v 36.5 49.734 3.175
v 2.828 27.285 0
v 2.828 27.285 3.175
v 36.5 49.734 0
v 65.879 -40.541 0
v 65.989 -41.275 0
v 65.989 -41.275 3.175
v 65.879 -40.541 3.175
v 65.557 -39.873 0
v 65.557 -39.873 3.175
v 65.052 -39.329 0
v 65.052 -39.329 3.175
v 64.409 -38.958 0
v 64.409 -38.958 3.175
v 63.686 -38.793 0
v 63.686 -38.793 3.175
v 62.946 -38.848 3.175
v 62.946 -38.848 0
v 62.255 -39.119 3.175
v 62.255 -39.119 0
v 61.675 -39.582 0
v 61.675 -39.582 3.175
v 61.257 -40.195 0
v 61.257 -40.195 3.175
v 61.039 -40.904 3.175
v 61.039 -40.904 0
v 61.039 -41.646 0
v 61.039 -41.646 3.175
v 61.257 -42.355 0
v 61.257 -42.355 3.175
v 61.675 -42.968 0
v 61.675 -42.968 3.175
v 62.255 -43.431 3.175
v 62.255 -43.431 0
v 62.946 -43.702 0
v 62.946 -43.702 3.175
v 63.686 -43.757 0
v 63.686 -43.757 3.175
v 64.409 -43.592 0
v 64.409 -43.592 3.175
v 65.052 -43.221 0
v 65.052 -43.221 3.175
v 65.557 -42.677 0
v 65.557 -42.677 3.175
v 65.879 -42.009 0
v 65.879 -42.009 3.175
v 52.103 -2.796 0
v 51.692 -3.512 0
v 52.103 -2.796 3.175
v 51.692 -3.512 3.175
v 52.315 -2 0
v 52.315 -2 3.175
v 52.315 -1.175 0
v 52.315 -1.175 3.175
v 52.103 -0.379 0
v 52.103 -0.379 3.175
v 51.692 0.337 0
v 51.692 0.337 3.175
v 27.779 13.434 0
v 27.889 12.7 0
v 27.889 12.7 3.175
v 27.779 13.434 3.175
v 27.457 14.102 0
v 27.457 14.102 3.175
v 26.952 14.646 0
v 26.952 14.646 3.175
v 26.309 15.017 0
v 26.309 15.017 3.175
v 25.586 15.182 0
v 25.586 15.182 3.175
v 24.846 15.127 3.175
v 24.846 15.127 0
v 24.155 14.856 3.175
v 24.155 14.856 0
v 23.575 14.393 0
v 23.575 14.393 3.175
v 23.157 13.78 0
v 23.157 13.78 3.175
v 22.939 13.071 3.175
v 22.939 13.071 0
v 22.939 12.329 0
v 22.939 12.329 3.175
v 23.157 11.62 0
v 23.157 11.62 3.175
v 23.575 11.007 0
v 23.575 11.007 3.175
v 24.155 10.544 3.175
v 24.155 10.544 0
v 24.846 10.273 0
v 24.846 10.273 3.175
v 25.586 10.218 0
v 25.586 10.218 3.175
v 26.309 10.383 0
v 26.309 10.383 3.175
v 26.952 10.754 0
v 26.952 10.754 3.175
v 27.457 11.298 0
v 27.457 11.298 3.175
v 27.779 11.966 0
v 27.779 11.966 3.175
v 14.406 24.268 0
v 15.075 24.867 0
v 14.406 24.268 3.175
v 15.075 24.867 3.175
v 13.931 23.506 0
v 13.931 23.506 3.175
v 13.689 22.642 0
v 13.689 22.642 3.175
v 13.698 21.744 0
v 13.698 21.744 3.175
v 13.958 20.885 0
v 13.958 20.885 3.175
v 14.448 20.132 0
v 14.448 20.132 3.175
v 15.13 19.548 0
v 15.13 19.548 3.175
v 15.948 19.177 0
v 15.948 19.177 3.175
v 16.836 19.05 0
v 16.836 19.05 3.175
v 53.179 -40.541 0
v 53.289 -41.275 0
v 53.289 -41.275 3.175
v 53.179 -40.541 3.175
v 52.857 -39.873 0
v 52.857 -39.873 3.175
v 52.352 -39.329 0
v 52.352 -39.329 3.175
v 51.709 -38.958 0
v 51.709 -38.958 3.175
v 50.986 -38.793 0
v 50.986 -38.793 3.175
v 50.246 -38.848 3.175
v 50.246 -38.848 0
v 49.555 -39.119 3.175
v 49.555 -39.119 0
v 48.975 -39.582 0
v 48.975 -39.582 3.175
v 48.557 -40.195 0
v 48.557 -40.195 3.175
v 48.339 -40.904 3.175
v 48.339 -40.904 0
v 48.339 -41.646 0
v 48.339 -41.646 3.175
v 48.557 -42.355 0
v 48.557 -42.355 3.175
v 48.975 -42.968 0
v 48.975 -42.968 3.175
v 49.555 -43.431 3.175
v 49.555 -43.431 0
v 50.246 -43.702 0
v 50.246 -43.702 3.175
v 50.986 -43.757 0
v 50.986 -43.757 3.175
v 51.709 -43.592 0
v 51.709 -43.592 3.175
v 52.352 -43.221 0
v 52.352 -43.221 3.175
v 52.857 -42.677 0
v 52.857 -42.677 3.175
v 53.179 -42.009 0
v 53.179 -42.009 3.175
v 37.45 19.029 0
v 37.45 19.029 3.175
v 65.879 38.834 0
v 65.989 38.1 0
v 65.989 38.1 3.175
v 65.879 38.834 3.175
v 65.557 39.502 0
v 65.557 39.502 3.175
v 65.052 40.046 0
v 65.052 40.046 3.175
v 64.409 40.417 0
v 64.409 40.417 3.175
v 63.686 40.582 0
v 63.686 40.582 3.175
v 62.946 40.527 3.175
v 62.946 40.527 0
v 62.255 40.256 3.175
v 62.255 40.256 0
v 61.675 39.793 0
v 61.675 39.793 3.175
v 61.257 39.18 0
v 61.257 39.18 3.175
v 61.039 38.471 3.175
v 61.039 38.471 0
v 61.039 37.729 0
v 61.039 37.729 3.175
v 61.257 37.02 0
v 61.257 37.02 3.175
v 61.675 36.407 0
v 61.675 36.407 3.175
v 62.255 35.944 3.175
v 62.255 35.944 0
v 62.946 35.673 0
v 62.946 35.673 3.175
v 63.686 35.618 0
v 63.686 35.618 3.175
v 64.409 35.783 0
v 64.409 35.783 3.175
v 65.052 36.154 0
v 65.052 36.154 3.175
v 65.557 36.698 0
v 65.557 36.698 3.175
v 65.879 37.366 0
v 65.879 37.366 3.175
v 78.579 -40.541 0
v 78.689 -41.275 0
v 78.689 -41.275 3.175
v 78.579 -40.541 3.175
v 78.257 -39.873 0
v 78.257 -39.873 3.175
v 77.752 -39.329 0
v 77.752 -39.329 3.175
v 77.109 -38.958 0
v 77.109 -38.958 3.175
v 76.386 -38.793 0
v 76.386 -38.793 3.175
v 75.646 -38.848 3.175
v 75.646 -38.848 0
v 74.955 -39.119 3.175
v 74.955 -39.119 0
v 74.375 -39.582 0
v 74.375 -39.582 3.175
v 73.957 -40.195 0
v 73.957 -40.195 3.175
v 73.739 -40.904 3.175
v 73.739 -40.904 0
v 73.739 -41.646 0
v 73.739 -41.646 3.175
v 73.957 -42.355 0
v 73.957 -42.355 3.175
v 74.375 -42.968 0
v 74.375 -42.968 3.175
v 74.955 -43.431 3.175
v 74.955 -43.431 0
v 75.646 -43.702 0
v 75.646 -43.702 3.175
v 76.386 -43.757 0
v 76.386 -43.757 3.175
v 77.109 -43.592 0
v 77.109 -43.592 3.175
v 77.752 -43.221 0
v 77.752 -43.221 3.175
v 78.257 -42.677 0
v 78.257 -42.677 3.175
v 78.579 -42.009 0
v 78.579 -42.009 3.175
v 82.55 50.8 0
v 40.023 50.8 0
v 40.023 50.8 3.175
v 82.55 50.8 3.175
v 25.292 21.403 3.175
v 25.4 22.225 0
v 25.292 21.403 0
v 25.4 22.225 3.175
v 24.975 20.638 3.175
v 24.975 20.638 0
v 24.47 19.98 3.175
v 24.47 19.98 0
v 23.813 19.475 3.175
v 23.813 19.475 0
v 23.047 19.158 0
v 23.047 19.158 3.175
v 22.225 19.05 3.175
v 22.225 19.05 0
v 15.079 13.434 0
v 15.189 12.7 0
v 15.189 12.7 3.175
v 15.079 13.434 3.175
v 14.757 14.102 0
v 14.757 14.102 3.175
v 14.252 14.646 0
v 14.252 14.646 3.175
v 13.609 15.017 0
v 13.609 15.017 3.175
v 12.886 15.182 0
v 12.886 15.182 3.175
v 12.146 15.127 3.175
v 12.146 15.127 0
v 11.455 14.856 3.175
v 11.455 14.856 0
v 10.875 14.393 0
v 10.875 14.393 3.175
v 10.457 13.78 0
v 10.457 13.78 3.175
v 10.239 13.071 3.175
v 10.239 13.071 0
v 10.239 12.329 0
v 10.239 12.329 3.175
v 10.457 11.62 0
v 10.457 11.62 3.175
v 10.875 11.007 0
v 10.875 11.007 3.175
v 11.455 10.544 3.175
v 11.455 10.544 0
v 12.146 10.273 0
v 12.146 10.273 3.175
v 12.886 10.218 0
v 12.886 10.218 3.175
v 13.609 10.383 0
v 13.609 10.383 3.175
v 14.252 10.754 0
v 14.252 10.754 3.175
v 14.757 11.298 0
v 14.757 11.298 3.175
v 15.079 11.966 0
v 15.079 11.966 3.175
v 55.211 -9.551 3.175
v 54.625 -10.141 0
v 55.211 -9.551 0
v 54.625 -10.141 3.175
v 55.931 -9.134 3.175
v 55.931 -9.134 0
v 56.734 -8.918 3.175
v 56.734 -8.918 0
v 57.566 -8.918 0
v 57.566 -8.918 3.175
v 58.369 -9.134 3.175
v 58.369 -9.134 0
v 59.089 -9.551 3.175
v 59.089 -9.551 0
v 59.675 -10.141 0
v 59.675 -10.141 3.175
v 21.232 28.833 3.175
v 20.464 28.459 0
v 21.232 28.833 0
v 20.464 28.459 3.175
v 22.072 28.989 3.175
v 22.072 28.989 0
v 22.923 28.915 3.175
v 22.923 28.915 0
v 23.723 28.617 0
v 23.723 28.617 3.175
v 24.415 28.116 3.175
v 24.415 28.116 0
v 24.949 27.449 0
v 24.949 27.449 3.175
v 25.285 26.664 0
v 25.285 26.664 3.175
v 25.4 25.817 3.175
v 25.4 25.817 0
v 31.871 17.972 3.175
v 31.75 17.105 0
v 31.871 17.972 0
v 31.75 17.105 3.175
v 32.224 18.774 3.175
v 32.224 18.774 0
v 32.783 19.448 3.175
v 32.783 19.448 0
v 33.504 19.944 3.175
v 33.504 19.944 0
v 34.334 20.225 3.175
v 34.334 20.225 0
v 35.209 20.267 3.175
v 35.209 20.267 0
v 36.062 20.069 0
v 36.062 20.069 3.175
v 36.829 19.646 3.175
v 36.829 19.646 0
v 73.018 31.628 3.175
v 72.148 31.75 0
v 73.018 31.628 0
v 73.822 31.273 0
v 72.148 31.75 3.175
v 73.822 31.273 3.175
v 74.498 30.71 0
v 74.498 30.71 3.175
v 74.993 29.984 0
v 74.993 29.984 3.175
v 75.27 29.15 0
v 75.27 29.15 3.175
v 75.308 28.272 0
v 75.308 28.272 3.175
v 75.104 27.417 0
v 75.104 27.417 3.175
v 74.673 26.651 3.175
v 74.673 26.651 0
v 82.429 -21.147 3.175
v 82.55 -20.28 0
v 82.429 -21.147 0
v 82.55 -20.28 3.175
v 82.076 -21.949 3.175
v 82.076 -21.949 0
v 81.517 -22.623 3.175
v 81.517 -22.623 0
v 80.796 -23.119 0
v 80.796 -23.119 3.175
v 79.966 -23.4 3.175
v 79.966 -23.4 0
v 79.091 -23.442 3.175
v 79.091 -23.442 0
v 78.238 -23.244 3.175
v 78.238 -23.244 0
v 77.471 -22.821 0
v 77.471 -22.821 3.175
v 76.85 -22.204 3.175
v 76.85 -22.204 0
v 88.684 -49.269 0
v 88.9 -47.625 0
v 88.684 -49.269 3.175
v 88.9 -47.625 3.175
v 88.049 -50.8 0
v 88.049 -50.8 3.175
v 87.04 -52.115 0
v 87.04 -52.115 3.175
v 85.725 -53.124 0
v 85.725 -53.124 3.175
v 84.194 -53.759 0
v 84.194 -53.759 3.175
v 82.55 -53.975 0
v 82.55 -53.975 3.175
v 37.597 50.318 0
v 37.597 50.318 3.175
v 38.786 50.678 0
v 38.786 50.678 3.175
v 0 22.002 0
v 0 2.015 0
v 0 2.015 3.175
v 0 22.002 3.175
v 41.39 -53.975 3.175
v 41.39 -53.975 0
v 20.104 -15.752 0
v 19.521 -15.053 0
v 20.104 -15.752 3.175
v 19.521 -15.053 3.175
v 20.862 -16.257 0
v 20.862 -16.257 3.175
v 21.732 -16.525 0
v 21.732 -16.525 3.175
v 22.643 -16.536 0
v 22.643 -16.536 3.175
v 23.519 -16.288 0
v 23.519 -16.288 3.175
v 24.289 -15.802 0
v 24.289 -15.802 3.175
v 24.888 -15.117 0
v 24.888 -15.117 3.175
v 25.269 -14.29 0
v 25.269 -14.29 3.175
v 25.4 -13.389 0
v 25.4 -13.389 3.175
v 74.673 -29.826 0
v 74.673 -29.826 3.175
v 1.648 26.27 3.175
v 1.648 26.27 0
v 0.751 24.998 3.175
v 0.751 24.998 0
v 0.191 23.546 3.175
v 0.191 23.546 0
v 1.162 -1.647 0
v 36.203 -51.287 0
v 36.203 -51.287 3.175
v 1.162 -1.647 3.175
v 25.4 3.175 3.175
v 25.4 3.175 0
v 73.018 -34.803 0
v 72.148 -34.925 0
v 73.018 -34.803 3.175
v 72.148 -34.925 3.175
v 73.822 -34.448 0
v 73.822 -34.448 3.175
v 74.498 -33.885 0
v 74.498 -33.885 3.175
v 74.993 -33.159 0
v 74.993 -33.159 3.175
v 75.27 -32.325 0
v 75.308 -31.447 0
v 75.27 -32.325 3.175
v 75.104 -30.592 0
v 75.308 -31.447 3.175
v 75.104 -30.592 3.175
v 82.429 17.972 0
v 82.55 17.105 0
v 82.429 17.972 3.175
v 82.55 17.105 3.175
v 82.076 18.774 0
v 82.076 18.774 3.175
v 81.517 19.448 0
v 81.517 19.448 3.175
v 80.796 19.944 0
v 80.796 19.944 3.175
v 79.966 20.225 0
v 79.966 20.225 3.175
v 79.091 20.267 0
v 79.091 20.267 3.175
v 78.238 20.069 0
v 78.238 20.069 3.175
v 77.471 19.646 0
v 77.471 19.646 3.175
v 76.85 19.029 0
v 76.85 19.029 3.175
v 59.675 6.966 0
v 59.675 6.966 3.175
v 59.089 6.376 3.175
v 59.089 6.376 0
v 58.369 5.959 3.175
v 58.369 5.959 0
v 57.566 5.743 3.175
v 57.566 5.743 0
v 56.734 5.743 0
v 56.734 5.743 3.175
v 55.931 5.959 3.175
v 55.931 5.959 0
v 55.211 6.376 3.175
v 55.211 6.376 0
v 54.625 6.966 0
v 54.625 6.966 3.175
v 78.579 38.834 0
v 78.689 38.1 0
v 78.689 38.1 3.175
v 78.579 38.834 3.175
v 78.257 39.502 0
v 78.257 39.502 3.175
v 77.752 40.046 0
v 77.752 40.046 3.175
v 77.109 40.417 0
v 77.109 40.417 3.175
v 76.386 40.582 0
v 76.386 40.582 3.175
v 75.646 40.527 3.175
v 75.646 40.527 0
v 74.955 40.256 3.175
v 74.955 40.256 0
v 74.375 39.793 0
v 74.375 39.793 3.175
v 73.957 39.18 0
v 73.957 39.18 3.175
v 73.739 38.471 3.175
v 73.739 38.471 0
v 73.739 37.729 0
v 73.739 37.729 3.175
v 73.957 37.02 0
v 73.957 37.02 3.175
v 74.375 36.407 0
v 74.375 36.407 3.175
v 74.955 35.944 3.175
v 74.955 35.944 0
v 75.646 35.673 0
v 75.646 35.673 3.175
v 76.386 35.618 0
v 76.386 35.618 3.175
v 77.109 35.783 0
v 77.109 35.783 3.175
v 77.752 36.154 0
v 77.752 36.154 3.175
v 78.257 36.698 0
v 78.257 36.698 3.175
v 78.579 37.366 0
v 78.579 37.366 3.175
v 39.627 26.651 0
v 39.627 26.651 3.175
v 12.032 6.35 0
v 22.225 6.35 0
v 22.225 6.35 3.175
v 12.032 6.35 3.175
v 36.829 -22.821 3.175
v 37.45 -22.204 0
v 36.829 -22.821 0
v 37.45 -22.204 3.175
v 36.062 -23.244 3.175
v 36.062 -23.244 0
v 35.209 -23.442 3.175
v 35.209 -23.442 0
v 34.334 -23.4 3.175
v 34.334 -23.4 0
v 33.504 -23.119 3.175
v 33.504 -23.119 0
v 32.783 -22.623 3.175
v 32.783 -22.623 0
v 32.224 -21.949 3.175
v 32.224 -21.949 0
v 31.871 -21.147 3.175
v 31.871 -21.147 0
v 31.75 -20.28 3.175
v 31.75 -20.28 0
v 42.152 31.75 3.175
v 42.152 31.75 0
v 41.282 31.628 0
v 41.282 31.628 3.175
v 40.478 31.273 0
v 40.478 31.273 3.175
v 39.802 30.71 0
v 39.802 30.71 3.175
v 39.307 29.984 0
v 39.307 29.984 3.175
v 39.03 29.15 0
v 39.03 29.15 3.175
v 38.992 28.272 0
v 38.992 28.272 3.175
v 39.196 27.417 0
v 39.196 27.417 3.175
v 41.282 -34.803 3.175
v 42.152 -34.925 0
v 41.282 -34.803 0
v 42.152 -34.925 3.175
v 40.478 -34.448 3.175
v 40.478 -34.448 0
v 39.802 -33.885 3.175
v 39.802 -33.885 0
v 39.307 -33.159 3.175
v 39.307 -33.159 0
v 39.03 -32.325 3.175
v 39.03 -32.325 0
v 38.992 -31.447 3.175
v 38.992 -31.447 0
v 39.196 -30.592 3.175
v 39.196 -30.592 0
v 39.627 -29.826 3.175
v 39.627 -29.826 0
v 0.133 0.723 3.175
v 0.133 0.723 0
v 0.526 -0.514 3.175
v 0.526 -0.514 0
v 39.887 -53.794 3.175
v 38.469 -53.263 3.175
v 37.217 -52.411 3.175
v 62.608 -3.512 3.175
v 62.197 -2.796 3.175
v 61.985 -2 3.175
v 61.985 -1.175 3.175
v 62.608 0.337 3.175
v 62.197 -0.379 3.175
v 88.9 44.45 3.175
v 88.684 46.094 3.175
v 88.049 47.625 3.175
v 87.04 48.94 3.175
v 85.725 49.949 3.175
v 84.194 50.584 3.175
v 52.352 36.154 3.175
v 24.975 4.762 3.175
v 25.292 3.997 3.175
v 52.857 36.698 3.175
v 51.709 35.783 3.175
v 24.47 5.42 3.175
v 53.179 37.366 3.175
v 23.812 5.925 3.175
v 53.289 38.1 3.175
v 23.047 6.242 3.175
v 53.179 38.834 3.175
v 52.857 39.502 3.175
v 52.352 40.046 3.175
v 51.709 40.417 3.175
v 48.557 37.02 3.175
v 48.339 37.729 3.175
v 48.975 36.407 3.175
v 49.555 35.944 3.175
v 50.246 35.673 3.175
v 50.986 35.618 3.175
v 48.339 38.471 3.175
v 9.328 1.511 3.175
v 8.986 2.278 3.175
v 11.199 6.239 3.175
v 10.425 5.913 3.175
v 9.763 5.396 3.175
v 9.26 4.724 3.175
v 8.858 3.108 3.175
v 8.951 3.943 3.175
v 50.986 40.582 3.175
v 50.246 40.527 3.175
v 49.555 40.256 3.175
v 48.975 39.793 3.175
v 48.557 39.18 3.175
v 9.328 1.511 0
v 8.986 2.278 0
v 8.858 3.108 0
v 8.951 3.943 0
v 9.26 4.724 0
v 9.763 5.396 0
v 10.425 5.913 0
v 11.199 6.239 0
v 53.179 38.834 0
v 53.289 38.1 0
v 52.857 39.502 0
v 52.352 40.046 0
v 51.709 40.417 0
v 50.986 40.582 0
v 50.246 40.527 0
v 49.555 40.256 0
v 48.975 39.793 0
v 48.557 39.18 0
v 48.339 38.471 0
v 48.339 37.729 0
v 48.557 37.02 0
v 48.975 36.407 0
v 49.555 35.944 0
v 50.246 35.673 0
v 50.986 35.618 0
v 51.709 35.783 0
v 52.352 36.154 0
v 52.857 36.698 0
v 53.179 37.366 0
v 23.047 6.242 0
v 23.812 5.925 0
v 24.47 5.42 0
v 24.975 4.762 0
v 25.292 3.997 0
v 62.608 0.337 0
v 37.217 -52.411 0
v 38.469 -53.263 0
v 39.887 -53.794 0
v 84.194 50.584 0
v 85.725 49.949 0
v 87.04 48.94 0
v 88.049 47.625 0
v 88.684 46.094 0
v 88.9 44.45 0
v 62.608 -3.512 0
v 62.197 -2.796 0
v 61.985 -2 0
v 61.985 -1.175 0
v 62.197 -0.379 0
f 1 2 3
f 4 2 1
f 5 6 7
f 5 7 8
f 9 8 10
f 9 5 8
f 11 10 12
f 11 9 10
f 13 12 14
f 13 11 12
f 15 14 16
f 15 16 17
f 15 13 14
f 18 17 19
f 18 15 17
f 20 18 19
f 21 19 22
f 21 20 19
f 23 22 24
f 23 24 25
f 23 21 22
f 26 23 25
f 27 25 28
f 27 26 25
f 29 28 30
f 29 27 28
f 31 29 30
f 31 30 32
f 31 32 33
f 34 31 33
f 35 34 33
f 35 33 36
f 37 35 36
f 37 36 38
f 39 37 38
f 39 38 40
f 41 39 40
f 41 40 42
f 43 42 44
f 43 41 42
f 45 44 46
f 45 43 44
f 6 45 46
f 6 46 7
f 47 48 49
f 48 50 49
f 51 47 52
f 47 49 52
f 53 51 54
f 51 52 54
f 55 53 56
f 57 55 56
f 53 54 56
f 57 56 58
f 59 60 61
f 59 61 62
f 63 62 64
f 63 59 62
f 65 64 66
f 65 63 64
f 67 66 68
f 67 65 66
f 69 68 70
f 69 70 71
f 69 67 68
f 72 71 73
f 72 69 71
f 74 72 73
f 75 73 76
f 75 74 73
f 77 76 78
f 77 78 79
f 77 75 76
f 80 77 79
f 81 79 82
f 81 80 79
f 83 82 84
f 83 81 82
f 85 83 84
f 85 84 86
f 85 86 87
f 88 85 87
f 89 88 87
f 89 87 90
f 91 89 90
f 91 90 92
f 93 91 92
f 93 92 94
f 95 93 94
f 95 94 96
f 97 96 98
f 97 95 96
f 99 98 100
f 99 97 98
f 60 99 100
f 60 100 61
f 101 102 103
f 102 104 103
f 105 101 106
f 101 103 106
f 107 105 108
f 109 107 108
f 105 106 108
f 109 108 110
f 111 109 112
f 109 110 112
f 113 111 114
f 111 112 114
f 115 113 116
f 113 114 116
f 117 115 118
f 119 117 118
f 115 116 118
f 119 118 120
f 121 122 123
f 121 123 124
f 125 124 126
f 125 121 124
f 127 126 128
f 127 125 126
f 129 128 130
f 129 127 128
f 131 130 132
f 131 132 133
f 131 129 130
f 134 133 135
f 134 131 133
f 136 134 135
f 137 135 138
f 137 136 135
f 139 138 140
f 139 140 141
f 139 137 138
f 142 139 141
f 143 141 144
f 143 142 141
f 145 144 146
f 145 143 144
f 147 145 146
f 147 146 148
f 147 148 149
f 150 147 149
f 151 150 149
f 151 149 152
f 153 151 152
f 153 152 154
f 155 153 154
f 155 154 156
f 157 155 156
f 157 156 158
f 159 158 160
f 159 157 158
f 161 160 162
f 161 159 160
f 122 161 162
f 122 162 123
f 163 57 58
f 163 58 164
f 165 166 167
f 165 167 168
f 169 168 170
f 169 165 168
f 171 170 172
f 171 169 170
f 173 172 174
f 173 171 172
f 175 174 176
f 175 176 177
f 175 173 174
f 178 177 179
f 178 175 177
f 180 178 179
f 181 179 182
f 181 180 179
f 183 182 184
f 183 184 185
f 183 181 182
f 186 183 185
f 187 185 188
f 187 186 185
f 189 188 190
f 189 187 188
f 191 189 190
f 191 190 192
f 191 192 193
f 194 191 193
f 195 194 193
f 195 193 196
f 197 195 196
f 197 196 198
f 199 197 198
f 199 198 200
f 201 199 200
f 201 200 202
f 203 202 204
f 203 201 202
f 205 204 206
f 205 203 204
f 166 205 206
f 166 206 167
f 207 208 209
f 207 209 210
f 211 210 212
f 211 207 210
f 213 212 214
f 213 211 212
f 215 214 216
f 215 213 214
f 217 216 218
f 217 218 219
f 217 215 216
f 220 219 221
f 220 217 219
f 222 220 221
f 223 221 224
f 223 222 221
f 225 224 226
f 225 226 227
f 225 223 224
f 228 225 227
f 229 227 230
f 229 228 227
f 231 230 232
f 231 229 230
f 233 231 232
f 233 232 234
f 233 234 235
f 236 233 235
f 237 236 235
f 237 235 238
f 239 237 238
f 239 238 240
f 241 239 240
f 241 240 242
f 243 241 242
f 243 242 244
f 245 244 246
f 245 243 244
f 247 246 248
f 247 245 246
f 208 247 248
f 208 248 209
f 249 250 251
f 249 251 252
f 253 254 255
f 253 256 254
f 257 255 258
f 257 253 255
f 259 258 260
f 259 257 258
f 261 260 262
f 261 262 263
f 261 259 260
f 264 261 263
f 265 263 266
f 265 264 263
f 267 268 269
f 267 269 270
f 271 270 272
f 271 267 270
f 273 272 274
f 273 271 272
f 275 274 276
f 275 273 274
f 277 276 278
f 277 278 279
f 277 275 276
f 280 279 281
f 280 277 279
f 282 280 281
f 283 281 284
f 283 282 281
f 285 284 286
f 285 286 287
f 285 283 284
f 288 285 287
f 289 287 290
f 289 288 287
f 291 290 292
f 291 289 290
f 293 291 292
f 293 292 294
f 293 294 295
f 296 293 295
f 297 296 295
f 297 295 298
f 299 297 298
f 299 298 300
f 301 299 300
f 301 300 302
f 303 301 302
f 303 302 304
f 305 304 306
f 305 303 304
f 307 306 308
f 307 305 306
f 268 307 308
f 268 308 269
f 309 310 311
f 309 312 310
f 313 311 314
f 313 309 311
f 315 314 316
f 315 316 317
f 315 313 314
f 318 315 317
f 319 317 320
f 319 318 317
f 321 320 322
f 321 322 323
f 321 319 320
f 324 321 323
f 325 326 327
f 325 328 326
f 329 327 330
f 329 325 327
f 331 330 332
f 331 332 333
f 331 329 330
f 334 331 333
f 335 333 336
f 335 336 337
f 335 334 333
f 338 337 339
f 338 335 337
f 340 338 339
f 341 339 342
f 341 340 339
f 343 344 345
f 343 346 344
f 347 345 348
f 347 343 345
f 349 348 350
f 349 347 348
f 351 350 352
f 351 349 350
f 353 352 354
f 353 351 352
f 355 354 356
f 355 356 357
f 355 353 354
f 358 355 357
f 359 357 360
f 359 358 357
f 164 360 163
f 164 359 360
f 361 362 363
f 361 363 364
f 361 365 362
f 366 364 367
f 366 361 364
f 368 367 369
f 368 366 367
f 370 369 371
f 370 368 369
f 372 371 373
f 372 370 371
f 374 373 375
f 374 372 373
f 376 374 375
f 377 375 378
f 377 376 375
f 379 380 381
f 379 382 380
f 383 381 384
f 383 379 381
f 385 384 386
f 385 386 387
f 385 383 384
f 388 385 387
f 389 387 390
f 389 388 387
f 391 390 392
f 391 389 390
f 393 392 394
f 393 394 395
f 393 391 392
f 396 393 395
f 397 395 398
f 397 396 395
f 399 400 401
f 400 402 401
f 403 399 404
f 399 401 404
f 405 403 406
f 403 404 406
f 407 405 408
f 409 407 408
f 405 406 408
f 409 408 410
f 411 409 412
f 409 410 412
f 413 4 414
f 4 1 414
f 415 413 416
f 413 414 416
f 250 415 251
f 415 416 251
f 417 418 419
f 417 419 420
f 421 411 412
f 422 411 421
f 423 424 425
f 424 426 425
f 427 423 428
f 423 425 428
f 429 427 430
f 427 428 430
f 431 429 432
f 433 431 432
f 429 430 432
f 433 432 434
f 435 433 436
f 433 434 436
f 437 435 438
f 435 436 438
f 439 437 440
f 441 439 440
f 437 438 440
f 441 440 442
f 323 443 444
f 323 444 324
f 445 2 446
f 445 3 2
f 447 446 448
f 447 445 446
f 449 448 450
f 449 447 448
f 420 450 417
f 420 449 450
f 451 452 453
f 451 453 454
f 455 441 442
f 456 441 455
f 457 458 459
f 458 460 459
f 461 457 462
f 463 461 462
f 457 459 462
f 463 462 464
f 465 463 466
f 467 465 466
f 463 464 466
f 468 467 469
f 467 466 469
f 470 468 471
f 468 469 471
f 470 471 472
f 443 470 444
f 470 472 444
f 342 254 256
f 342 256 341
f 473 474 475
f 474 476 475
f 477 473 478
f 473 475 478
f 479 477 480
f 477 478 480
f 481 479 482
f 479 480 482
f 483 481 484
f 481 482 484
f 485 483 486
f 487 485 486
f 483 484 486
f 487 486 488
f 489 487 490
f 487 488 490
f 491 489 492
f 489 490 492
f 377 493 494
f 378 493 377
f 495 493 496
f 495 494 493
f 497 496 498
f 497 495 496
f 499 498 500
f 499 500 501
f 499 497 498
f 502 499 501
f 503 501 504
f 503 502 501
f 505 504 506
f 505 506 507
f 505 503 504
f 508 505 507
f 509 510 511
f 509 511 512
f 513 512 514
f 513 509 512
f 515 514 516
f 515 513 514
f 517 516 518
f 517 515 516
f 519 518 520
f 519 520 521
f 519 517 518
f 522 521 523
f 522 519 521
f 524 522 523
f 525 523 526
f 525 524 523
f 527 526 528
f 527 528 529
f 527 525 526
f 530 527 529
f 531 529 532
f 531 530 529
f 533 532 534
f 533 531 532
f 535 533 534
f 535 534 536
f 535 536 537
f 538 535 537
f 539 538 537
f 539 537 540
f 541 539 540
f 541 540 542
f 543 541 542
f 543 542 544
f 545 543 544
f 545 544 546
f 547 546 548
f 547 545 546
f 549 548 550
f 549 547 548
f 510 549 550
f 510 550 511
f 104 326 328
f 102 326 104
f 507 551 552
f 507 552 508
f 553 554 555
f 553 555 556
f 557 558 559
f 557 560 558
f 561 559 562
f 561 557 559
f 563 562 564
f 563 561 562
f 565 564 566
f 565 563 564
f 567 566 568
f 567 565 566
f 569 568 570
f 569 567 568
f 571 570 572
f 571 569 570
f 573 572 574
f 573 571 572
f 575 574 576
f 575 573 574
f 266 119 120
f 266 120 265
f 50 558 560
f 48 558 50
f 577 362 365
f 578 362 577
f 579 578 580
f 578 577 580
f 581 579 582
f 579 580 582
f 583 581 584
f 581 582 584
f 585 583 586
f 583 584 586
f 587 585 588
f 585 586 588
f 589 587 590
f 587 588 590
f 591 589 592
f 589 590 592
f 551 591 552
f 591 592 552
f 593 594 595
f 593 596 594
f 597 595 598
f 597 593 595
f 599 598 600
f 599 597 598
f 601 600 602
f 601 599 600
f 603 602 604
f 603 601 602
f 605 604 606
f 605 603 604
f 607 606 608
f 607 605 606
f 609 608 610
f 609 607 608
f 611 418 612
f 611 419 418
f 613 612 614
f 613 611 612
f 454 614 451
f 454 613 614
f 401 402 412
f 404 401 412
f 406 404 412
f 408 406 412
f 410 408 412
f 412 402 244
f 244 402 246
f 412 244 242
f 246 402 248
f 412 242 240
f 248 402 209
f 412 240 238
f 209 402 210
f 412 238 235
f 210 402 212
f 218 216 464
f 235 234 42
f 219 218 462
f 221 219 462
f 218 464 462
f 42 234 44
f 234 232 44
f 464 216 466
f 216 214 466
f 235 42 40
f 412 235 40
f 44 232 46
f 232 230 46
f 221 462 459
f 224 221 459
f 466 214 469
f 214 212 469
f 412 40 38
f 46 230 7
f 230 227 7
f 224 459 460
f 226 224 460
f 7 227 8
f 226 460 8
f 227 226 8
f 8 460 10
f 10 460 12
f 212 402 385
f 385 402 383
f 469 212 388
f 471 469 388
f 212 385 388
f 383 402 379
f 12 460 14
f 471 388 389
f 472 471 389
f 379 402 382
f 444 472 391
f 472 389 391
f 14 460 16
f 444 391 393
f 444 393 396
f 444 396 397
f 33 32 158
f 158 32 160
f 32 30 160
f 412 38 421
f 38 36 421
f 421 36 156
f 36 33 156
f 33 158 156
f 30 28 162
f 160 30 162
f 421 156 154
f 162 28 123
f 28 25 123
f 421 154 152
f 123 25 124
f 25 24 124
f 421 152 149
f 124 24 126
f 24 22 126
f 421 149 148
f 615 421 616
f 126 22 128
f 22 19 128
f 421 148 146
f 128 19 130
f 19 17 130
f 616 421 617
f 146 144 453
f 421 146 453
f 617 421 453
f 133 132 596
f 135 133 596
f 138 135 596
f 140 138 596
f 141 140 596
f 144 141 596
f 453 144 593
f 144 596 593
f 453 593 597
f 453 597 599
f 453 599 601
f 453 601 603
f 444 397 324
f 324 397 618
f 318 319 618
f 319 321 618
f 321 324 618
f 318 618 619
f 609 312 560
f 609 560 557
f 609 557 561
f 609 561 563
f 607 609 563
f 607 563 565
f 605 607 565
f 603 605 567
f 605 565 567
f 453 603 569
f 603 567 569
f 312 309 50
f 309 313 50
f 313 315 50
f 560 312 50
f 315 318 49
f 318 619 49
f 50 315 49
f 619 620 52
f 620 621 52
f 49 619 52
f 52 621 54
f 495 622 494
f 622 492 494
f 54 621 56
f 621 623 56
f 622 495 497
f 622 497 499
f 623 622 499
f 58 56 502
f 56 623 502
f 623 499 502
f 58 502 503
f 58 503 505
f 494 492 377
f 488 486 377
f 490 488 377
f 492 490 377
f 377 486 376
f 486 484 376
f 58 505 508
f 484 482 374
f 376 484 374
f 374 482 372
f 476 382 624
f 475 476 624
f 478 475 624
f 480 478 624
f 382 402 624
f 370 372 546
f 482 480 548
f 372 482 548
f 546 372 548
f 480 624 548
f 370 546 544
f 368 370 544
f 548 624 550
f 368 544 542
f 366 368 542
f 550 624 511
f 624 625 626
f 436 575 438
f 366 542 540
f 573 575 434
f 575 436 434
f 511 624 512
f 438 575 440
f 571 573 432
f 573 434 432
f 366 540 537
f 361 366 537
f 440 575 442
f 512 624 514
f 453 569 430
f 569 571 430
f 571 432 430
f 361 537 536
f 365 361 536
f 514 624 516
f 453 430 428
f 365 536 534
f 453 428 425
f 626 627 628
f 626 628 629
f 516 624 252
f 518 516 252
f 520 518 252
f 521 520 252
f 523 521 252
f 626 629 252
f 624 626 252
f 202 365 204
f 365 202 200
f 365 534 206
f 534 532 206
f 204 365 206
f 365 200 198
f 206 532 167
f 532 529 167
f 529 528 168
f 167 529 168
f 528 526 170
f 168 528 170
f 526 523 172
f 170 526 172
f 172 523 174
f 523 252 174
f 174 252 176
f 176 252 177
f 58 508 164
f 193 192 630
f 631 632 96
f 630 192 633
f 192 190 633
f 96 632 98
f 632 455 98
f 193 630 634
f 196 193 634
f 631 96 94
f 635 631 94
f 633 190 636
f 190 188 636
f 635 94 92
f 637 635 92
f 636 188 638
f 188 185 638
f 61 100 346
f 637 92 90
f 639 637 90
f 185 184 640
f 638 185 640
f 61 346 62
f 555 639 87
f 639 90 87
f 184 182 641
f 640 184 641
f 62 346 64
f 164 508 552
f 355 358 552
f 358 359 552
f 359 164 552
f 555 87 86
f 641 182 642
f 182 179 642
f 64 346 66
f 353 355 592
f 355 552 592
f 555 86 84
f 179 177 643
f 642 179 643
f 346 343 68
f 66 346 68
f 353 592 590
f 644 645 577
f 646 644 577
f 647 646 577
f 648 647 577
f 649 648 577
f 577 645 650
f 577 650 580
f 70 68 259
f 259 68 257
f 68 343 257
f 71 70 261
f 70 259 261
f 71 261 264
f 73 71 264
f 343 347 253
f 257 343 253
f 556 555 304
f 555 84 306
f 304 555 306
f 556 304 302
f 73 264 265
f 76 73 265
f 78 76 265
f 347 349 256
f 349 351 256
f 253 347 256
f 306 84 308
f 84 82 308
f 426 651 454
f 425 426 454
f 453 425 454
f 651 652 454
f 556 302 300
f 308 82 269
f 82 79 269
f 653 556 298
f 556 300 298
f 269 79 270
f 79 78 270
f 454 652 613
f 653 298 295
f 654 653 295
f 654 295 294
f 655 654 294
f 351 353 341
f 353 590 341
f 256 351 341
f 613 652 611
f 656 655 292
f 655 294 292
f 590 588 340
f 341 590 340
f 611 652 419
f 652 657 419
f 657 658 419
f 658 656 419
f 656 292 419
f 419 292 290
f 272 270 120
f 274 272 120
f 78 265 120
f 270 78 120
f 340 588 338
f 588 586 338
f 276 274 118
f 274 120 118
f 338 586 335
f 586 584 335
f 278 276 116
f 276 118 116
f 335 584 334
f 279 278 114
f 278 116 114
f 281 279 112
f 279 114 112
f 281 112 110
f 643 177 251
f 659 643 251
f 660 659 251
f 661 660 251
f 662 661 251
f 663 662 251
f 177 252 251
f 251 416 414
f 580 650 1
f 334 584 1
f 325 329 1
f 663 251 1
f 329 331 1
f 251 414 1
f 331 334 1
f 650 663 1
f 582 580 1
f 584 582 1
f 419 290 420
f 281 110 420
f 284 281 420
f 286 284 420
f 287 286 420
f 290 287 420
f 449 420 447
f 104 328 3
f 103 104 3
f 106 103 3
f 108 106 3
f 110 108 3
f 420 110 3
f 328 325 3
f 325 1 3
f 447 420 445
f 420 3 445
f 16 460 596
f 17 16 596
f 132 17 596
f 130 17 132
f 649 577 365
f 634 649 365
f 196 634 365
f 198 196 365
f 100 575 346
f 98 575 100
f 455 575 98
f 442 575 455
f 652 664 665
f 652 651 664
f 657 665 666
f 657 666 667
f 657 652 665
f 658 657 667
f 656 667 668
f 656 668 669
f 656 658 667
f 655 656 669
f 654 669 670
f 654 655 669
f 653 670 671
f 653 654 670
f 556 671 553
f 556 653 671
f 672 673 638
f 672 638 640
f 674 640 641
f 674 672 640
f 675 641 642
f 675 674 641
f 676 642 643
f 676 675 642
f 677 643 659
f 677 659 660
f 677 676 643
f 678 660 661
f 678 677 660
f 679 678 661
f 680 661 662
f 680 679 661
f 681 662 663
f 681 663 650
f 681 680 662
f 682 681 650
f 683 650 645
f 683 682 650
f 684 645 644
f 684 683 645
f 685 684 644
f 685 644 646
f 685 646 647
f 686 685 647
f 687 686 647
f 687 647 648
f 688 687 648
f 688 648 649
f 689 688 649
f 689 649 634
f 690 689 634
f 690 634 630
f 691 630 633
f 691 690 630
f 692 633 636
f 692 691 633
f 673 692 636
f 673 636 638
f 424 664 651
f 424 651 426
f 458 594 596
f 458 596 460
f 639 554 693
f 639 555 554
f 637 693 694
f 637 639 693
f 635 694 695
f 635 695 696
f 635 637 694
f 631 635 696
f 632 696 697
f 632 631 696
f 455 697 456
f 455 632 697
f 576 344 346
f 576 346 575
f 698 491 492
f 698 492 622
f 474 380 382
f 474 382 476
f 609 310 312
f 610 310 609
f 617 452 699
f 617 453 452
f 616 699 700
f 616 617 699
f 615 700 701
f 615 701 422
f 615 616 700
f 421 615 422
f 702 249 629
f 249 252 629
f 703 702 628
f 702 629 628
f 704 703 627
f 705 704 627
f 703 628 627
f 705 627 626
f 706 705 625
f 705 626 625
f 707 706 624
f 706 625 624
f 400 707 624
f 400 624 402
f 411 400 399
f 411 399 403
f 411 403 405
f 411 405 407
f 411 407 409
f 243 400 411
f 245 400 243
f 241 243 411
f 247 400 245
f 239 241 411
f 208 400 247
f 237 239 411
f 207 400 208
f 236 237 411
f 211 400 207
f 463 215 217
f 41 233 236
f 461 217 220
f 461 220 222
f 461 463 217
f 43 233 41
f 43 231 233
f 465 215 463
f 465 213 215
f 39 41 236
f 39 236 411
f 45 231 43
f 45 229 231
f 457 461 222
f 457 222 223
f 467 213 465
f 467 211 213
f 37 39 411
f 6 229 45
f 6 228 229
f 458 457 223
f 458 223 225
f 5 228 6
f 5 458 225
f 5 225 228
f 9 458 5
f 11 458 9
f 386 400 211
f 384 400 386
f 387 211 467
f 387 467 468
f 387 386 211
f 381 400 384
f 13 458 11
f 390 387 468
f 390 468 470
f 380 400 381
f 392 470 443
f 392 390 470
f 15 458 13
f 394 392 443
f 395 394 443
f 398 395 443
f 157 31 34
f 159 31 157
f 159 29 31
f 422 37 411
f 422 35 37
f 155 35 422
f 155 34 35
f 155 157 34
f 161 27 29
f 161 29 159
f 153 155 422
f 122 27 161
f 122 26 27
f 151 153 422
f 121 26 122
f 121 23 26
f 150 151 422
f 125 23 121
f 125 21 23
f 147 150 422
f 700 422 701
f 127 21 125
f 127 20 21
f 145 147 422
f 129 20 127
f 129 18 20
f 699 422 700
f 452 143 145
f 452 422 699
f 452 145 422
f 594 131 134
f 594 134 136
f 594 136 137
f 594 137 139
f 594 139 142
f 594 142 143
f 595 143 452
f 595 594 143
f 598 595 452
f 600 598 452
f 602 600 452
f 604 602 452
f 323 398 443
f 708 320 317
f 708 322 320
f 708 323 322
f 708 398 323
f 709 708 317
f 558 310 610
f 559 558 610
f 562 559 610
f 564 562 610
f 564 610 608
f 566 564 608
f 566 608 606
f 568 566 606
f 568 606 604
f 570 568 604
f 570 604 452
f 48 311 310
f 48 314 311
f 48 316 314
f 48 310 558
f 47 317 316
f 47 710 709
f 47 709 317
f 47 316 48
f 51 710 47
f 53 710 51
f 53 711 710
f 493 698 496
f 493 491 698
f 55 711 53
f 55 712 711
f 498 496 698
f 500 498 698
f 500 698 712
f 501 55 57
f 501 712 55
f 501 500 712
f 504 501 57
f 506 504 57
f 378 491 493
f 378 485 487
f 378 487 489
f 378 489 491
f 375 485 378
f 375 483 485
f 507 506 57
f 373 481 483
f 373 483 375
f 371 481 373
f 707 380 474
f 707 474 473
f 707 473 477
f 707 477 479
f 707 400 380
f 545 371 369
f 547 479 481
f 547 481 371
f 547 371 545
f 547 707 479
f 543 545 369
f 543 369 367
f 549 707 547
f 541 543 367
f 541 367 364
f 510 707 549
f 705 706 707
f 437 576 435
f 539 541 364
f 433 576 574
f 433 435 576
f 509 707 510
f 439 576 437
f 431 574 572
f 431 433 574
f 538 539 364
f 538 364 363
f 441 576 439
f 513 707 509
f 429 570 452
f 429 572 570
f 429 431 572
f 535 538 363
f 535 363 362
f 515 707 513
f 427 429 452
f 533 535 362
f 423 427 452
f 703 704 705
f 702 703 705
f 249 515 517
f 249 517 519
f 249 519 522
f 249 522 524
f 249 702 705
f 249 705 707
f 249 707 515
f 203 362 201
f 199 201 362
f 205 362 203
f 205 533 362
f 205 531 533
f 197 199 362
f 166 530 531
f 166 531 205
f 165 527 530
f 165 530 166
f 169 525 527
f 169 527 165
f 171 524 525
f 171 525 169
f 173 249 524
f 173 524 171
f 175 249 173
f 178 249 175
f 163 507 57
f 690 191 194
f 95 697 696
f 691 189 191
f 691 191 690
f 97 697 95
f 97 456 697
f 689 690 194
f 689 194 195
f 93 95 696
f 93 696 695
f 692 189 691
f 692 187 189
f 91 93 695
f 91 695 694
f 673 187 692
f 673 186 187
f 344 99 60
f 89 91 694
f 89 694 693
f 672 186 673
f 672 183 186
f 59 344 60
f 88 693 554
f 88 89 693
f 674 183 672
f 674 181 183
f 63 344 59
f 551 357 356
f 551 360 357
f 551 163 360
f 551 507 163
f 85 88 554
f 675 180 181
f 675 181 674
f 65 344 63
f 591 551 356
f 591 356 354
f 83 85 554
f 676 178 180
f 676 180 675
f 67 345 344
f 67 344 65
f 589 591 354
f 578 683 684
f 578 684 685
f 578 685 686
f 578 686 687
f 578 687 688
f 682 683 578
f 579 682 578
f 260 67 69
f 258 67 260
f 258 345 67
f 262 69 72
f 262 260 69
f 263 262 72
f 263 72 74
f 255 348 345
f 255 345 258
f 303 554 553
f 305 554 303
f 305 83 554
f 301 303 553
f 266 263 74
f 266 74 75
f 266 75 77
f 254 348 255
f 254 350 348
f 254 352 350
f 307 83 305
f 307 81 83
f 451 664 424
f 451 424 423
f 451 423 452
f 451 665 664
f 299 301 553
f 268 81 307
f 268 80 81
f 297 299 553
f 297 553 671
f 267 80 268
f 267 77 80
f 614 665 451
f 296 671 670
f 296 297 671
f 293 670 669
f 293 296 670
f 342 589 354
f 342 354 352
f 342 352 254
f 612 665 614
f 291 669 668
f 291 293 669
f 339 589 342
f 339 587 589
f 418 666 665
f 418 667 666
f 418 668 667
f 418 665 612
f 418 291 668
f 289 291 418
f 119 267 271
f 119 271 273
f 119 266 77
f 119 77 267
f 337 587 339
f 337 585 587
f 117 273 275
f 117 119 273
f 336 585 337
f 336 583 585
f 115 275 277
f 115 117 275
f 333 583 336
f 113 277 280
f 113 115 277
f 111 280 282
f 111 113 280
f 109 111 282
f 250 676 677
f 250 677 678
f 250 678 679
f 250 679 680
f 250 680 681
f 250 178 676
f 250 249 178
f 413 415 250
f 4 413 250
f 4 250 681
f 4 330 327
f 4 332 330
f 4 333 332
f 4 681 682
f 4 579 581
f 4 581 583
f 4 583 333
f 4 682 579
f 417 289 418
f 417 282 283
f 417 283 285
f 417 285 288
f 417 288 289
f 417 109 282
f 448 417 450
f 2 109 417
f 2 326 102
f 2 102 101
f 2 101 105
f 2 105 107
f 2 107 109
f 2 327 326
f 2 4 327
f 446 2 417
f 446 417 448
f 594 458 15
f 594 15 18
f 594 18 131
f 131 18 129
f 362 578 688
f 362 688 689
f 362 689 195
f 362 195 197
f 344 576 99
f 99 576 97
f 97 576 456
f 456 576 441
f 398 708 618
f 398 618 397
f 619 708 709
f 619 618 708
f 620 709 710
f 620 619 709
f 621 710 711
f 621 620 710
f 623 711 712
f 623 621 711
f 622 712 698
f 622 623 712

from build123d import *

# Parameters (mm, degrees)
SKETCH1_R           = 2.4892
BOSS_EXTRUDE1_DEPTH = 3.175
FILLET1_R           = 6.35
CUT_EXTRUDE1_DEPTH  = 105.050907012
FILLET3_R           = 3.175


with BuildPart() as part:
    # Sketch1 → Boss-Extrude1 (new body)
    with BuildSketch(Plane.XY):
        Polygon((0, 25.4), (38.1, 50.8), (88.9, 50.8), (88.9, -53.975), (38.1, -53.975), (0, 0), align=None)
        with Locations((12.7, 12.7)):
            Circle(SKETCH1_R, mode=Mode.SUBTRACT)
        with Locations((25.4, 12.7)):
            Circle(SKETCH1_R, mode=Mode.SUBTRACT)
        with Locations((50.8, 38.1)):
            Circle(SKETCH1_R, mode=Mode.SUBTRACT)
        with Locations((63.5, 38.1)):
            Circle(SKETCH1_R, mode=Mode.SUBTRACT)
        with Locations((76.2, 38.1)):
            Circle(SKETCH1_R, mode=Mode.SUBTRACT)
        with Locations((50.8, -41.275)):
            Circle(SKETCH1_R, mode=Mode.SUBTRACT)
        with Locations((76.2, -41.275)):
            Circle(SKETCH1_R, mode=Mode.SUBTRACT)
        with Locations((63.5, -41.275)):
            Circle(SKETCH1_R, mode=Mode.SUBTRACT)
    extrude(amount=BOSS_EXTRUDE1_DEPTH)

    # Fillet1
    fillet1_edges = [part.edges().sort_by_distance(p)[0] for p in [
        (0, 0, 1.5875),
        (0, 25.4, 1.5875),
        (38.1, 50.8, 1.5875),
        (88.9, 50.8, 1.5875),
        (88.9, -53.975, 1.5875),
        (38.1, -53.975, 1.5875),
    ]]
    fillet(fillet1_edges, radius=FILLET1_R)

    # Sketch2 → Cut-Extrude1 (cut, through all)
    with BuildSketch(Plane.XY):
        Polygon((25.4, -24.60625), (25.4, 6.35), (6.35, 6.35), align=None)
        Polygon((53.158456892, -1.5875), (31.75, 26.511099671), (31.75, 6.35), (31.75, -29.686099671), align=None)
        Polygon((78.558456892, -34.925), (57.15, -6.826400329), (35.741543108, -34.925), align=None)
        Polygon((82.55, 26.511099671), (61.141543108, -1.5875), (82.55, -29.686099671), align=None)
        Polygon((35.741543108, 31.75), (57.15, 3.651400329), (78.558456892, 31.75), align=None)
        Polygon((6.35, 19.05), (25.4, 19.05), (25.4, 31.75), align=None)
    extrude(amount=CUT_EXTRUDE1_DEPTH, mode=Mode.SUBTRACT)

    # Fillet3
    fillet3_edges = [part.edges().sort_by_distance(p)[0] for p in [
        (25.4, 31.75, 1.5875),
        (6.35, 19.05, 1.5875),
        (25.4, 19.05, 1.5875),
        (57.15, -6.826400329, 1.5875),
        (35.741543108, -34.925, 1.5875),
        (78.558456892, -34.925, 1.5875),
        (53.158456892, -1.5875, 1.5875),
        (31.75, 26.511099671, 1.5875),
        (31.75, -29.686099671, 1.5875),
        (78.558456892, 31.75, 1.5875),
        (35.741543108, 31.75, 1.5875),
        (57.15, 3.651400329, 1.5875),
        (82.55, -29.686099671, 1.5875),
        (82.55, 26.511099671, 1.5875),
        (61.141543108, -1.5875, 1.5875),
        (25.4, -24.60625, 1.5875),
        (25.4, 6.35, 1.5875),
        (6.35, 6.35, 1.5875),
    ]]
    fillet(fillet3_edges, radius=FILLET3_R)


solid = part.part
